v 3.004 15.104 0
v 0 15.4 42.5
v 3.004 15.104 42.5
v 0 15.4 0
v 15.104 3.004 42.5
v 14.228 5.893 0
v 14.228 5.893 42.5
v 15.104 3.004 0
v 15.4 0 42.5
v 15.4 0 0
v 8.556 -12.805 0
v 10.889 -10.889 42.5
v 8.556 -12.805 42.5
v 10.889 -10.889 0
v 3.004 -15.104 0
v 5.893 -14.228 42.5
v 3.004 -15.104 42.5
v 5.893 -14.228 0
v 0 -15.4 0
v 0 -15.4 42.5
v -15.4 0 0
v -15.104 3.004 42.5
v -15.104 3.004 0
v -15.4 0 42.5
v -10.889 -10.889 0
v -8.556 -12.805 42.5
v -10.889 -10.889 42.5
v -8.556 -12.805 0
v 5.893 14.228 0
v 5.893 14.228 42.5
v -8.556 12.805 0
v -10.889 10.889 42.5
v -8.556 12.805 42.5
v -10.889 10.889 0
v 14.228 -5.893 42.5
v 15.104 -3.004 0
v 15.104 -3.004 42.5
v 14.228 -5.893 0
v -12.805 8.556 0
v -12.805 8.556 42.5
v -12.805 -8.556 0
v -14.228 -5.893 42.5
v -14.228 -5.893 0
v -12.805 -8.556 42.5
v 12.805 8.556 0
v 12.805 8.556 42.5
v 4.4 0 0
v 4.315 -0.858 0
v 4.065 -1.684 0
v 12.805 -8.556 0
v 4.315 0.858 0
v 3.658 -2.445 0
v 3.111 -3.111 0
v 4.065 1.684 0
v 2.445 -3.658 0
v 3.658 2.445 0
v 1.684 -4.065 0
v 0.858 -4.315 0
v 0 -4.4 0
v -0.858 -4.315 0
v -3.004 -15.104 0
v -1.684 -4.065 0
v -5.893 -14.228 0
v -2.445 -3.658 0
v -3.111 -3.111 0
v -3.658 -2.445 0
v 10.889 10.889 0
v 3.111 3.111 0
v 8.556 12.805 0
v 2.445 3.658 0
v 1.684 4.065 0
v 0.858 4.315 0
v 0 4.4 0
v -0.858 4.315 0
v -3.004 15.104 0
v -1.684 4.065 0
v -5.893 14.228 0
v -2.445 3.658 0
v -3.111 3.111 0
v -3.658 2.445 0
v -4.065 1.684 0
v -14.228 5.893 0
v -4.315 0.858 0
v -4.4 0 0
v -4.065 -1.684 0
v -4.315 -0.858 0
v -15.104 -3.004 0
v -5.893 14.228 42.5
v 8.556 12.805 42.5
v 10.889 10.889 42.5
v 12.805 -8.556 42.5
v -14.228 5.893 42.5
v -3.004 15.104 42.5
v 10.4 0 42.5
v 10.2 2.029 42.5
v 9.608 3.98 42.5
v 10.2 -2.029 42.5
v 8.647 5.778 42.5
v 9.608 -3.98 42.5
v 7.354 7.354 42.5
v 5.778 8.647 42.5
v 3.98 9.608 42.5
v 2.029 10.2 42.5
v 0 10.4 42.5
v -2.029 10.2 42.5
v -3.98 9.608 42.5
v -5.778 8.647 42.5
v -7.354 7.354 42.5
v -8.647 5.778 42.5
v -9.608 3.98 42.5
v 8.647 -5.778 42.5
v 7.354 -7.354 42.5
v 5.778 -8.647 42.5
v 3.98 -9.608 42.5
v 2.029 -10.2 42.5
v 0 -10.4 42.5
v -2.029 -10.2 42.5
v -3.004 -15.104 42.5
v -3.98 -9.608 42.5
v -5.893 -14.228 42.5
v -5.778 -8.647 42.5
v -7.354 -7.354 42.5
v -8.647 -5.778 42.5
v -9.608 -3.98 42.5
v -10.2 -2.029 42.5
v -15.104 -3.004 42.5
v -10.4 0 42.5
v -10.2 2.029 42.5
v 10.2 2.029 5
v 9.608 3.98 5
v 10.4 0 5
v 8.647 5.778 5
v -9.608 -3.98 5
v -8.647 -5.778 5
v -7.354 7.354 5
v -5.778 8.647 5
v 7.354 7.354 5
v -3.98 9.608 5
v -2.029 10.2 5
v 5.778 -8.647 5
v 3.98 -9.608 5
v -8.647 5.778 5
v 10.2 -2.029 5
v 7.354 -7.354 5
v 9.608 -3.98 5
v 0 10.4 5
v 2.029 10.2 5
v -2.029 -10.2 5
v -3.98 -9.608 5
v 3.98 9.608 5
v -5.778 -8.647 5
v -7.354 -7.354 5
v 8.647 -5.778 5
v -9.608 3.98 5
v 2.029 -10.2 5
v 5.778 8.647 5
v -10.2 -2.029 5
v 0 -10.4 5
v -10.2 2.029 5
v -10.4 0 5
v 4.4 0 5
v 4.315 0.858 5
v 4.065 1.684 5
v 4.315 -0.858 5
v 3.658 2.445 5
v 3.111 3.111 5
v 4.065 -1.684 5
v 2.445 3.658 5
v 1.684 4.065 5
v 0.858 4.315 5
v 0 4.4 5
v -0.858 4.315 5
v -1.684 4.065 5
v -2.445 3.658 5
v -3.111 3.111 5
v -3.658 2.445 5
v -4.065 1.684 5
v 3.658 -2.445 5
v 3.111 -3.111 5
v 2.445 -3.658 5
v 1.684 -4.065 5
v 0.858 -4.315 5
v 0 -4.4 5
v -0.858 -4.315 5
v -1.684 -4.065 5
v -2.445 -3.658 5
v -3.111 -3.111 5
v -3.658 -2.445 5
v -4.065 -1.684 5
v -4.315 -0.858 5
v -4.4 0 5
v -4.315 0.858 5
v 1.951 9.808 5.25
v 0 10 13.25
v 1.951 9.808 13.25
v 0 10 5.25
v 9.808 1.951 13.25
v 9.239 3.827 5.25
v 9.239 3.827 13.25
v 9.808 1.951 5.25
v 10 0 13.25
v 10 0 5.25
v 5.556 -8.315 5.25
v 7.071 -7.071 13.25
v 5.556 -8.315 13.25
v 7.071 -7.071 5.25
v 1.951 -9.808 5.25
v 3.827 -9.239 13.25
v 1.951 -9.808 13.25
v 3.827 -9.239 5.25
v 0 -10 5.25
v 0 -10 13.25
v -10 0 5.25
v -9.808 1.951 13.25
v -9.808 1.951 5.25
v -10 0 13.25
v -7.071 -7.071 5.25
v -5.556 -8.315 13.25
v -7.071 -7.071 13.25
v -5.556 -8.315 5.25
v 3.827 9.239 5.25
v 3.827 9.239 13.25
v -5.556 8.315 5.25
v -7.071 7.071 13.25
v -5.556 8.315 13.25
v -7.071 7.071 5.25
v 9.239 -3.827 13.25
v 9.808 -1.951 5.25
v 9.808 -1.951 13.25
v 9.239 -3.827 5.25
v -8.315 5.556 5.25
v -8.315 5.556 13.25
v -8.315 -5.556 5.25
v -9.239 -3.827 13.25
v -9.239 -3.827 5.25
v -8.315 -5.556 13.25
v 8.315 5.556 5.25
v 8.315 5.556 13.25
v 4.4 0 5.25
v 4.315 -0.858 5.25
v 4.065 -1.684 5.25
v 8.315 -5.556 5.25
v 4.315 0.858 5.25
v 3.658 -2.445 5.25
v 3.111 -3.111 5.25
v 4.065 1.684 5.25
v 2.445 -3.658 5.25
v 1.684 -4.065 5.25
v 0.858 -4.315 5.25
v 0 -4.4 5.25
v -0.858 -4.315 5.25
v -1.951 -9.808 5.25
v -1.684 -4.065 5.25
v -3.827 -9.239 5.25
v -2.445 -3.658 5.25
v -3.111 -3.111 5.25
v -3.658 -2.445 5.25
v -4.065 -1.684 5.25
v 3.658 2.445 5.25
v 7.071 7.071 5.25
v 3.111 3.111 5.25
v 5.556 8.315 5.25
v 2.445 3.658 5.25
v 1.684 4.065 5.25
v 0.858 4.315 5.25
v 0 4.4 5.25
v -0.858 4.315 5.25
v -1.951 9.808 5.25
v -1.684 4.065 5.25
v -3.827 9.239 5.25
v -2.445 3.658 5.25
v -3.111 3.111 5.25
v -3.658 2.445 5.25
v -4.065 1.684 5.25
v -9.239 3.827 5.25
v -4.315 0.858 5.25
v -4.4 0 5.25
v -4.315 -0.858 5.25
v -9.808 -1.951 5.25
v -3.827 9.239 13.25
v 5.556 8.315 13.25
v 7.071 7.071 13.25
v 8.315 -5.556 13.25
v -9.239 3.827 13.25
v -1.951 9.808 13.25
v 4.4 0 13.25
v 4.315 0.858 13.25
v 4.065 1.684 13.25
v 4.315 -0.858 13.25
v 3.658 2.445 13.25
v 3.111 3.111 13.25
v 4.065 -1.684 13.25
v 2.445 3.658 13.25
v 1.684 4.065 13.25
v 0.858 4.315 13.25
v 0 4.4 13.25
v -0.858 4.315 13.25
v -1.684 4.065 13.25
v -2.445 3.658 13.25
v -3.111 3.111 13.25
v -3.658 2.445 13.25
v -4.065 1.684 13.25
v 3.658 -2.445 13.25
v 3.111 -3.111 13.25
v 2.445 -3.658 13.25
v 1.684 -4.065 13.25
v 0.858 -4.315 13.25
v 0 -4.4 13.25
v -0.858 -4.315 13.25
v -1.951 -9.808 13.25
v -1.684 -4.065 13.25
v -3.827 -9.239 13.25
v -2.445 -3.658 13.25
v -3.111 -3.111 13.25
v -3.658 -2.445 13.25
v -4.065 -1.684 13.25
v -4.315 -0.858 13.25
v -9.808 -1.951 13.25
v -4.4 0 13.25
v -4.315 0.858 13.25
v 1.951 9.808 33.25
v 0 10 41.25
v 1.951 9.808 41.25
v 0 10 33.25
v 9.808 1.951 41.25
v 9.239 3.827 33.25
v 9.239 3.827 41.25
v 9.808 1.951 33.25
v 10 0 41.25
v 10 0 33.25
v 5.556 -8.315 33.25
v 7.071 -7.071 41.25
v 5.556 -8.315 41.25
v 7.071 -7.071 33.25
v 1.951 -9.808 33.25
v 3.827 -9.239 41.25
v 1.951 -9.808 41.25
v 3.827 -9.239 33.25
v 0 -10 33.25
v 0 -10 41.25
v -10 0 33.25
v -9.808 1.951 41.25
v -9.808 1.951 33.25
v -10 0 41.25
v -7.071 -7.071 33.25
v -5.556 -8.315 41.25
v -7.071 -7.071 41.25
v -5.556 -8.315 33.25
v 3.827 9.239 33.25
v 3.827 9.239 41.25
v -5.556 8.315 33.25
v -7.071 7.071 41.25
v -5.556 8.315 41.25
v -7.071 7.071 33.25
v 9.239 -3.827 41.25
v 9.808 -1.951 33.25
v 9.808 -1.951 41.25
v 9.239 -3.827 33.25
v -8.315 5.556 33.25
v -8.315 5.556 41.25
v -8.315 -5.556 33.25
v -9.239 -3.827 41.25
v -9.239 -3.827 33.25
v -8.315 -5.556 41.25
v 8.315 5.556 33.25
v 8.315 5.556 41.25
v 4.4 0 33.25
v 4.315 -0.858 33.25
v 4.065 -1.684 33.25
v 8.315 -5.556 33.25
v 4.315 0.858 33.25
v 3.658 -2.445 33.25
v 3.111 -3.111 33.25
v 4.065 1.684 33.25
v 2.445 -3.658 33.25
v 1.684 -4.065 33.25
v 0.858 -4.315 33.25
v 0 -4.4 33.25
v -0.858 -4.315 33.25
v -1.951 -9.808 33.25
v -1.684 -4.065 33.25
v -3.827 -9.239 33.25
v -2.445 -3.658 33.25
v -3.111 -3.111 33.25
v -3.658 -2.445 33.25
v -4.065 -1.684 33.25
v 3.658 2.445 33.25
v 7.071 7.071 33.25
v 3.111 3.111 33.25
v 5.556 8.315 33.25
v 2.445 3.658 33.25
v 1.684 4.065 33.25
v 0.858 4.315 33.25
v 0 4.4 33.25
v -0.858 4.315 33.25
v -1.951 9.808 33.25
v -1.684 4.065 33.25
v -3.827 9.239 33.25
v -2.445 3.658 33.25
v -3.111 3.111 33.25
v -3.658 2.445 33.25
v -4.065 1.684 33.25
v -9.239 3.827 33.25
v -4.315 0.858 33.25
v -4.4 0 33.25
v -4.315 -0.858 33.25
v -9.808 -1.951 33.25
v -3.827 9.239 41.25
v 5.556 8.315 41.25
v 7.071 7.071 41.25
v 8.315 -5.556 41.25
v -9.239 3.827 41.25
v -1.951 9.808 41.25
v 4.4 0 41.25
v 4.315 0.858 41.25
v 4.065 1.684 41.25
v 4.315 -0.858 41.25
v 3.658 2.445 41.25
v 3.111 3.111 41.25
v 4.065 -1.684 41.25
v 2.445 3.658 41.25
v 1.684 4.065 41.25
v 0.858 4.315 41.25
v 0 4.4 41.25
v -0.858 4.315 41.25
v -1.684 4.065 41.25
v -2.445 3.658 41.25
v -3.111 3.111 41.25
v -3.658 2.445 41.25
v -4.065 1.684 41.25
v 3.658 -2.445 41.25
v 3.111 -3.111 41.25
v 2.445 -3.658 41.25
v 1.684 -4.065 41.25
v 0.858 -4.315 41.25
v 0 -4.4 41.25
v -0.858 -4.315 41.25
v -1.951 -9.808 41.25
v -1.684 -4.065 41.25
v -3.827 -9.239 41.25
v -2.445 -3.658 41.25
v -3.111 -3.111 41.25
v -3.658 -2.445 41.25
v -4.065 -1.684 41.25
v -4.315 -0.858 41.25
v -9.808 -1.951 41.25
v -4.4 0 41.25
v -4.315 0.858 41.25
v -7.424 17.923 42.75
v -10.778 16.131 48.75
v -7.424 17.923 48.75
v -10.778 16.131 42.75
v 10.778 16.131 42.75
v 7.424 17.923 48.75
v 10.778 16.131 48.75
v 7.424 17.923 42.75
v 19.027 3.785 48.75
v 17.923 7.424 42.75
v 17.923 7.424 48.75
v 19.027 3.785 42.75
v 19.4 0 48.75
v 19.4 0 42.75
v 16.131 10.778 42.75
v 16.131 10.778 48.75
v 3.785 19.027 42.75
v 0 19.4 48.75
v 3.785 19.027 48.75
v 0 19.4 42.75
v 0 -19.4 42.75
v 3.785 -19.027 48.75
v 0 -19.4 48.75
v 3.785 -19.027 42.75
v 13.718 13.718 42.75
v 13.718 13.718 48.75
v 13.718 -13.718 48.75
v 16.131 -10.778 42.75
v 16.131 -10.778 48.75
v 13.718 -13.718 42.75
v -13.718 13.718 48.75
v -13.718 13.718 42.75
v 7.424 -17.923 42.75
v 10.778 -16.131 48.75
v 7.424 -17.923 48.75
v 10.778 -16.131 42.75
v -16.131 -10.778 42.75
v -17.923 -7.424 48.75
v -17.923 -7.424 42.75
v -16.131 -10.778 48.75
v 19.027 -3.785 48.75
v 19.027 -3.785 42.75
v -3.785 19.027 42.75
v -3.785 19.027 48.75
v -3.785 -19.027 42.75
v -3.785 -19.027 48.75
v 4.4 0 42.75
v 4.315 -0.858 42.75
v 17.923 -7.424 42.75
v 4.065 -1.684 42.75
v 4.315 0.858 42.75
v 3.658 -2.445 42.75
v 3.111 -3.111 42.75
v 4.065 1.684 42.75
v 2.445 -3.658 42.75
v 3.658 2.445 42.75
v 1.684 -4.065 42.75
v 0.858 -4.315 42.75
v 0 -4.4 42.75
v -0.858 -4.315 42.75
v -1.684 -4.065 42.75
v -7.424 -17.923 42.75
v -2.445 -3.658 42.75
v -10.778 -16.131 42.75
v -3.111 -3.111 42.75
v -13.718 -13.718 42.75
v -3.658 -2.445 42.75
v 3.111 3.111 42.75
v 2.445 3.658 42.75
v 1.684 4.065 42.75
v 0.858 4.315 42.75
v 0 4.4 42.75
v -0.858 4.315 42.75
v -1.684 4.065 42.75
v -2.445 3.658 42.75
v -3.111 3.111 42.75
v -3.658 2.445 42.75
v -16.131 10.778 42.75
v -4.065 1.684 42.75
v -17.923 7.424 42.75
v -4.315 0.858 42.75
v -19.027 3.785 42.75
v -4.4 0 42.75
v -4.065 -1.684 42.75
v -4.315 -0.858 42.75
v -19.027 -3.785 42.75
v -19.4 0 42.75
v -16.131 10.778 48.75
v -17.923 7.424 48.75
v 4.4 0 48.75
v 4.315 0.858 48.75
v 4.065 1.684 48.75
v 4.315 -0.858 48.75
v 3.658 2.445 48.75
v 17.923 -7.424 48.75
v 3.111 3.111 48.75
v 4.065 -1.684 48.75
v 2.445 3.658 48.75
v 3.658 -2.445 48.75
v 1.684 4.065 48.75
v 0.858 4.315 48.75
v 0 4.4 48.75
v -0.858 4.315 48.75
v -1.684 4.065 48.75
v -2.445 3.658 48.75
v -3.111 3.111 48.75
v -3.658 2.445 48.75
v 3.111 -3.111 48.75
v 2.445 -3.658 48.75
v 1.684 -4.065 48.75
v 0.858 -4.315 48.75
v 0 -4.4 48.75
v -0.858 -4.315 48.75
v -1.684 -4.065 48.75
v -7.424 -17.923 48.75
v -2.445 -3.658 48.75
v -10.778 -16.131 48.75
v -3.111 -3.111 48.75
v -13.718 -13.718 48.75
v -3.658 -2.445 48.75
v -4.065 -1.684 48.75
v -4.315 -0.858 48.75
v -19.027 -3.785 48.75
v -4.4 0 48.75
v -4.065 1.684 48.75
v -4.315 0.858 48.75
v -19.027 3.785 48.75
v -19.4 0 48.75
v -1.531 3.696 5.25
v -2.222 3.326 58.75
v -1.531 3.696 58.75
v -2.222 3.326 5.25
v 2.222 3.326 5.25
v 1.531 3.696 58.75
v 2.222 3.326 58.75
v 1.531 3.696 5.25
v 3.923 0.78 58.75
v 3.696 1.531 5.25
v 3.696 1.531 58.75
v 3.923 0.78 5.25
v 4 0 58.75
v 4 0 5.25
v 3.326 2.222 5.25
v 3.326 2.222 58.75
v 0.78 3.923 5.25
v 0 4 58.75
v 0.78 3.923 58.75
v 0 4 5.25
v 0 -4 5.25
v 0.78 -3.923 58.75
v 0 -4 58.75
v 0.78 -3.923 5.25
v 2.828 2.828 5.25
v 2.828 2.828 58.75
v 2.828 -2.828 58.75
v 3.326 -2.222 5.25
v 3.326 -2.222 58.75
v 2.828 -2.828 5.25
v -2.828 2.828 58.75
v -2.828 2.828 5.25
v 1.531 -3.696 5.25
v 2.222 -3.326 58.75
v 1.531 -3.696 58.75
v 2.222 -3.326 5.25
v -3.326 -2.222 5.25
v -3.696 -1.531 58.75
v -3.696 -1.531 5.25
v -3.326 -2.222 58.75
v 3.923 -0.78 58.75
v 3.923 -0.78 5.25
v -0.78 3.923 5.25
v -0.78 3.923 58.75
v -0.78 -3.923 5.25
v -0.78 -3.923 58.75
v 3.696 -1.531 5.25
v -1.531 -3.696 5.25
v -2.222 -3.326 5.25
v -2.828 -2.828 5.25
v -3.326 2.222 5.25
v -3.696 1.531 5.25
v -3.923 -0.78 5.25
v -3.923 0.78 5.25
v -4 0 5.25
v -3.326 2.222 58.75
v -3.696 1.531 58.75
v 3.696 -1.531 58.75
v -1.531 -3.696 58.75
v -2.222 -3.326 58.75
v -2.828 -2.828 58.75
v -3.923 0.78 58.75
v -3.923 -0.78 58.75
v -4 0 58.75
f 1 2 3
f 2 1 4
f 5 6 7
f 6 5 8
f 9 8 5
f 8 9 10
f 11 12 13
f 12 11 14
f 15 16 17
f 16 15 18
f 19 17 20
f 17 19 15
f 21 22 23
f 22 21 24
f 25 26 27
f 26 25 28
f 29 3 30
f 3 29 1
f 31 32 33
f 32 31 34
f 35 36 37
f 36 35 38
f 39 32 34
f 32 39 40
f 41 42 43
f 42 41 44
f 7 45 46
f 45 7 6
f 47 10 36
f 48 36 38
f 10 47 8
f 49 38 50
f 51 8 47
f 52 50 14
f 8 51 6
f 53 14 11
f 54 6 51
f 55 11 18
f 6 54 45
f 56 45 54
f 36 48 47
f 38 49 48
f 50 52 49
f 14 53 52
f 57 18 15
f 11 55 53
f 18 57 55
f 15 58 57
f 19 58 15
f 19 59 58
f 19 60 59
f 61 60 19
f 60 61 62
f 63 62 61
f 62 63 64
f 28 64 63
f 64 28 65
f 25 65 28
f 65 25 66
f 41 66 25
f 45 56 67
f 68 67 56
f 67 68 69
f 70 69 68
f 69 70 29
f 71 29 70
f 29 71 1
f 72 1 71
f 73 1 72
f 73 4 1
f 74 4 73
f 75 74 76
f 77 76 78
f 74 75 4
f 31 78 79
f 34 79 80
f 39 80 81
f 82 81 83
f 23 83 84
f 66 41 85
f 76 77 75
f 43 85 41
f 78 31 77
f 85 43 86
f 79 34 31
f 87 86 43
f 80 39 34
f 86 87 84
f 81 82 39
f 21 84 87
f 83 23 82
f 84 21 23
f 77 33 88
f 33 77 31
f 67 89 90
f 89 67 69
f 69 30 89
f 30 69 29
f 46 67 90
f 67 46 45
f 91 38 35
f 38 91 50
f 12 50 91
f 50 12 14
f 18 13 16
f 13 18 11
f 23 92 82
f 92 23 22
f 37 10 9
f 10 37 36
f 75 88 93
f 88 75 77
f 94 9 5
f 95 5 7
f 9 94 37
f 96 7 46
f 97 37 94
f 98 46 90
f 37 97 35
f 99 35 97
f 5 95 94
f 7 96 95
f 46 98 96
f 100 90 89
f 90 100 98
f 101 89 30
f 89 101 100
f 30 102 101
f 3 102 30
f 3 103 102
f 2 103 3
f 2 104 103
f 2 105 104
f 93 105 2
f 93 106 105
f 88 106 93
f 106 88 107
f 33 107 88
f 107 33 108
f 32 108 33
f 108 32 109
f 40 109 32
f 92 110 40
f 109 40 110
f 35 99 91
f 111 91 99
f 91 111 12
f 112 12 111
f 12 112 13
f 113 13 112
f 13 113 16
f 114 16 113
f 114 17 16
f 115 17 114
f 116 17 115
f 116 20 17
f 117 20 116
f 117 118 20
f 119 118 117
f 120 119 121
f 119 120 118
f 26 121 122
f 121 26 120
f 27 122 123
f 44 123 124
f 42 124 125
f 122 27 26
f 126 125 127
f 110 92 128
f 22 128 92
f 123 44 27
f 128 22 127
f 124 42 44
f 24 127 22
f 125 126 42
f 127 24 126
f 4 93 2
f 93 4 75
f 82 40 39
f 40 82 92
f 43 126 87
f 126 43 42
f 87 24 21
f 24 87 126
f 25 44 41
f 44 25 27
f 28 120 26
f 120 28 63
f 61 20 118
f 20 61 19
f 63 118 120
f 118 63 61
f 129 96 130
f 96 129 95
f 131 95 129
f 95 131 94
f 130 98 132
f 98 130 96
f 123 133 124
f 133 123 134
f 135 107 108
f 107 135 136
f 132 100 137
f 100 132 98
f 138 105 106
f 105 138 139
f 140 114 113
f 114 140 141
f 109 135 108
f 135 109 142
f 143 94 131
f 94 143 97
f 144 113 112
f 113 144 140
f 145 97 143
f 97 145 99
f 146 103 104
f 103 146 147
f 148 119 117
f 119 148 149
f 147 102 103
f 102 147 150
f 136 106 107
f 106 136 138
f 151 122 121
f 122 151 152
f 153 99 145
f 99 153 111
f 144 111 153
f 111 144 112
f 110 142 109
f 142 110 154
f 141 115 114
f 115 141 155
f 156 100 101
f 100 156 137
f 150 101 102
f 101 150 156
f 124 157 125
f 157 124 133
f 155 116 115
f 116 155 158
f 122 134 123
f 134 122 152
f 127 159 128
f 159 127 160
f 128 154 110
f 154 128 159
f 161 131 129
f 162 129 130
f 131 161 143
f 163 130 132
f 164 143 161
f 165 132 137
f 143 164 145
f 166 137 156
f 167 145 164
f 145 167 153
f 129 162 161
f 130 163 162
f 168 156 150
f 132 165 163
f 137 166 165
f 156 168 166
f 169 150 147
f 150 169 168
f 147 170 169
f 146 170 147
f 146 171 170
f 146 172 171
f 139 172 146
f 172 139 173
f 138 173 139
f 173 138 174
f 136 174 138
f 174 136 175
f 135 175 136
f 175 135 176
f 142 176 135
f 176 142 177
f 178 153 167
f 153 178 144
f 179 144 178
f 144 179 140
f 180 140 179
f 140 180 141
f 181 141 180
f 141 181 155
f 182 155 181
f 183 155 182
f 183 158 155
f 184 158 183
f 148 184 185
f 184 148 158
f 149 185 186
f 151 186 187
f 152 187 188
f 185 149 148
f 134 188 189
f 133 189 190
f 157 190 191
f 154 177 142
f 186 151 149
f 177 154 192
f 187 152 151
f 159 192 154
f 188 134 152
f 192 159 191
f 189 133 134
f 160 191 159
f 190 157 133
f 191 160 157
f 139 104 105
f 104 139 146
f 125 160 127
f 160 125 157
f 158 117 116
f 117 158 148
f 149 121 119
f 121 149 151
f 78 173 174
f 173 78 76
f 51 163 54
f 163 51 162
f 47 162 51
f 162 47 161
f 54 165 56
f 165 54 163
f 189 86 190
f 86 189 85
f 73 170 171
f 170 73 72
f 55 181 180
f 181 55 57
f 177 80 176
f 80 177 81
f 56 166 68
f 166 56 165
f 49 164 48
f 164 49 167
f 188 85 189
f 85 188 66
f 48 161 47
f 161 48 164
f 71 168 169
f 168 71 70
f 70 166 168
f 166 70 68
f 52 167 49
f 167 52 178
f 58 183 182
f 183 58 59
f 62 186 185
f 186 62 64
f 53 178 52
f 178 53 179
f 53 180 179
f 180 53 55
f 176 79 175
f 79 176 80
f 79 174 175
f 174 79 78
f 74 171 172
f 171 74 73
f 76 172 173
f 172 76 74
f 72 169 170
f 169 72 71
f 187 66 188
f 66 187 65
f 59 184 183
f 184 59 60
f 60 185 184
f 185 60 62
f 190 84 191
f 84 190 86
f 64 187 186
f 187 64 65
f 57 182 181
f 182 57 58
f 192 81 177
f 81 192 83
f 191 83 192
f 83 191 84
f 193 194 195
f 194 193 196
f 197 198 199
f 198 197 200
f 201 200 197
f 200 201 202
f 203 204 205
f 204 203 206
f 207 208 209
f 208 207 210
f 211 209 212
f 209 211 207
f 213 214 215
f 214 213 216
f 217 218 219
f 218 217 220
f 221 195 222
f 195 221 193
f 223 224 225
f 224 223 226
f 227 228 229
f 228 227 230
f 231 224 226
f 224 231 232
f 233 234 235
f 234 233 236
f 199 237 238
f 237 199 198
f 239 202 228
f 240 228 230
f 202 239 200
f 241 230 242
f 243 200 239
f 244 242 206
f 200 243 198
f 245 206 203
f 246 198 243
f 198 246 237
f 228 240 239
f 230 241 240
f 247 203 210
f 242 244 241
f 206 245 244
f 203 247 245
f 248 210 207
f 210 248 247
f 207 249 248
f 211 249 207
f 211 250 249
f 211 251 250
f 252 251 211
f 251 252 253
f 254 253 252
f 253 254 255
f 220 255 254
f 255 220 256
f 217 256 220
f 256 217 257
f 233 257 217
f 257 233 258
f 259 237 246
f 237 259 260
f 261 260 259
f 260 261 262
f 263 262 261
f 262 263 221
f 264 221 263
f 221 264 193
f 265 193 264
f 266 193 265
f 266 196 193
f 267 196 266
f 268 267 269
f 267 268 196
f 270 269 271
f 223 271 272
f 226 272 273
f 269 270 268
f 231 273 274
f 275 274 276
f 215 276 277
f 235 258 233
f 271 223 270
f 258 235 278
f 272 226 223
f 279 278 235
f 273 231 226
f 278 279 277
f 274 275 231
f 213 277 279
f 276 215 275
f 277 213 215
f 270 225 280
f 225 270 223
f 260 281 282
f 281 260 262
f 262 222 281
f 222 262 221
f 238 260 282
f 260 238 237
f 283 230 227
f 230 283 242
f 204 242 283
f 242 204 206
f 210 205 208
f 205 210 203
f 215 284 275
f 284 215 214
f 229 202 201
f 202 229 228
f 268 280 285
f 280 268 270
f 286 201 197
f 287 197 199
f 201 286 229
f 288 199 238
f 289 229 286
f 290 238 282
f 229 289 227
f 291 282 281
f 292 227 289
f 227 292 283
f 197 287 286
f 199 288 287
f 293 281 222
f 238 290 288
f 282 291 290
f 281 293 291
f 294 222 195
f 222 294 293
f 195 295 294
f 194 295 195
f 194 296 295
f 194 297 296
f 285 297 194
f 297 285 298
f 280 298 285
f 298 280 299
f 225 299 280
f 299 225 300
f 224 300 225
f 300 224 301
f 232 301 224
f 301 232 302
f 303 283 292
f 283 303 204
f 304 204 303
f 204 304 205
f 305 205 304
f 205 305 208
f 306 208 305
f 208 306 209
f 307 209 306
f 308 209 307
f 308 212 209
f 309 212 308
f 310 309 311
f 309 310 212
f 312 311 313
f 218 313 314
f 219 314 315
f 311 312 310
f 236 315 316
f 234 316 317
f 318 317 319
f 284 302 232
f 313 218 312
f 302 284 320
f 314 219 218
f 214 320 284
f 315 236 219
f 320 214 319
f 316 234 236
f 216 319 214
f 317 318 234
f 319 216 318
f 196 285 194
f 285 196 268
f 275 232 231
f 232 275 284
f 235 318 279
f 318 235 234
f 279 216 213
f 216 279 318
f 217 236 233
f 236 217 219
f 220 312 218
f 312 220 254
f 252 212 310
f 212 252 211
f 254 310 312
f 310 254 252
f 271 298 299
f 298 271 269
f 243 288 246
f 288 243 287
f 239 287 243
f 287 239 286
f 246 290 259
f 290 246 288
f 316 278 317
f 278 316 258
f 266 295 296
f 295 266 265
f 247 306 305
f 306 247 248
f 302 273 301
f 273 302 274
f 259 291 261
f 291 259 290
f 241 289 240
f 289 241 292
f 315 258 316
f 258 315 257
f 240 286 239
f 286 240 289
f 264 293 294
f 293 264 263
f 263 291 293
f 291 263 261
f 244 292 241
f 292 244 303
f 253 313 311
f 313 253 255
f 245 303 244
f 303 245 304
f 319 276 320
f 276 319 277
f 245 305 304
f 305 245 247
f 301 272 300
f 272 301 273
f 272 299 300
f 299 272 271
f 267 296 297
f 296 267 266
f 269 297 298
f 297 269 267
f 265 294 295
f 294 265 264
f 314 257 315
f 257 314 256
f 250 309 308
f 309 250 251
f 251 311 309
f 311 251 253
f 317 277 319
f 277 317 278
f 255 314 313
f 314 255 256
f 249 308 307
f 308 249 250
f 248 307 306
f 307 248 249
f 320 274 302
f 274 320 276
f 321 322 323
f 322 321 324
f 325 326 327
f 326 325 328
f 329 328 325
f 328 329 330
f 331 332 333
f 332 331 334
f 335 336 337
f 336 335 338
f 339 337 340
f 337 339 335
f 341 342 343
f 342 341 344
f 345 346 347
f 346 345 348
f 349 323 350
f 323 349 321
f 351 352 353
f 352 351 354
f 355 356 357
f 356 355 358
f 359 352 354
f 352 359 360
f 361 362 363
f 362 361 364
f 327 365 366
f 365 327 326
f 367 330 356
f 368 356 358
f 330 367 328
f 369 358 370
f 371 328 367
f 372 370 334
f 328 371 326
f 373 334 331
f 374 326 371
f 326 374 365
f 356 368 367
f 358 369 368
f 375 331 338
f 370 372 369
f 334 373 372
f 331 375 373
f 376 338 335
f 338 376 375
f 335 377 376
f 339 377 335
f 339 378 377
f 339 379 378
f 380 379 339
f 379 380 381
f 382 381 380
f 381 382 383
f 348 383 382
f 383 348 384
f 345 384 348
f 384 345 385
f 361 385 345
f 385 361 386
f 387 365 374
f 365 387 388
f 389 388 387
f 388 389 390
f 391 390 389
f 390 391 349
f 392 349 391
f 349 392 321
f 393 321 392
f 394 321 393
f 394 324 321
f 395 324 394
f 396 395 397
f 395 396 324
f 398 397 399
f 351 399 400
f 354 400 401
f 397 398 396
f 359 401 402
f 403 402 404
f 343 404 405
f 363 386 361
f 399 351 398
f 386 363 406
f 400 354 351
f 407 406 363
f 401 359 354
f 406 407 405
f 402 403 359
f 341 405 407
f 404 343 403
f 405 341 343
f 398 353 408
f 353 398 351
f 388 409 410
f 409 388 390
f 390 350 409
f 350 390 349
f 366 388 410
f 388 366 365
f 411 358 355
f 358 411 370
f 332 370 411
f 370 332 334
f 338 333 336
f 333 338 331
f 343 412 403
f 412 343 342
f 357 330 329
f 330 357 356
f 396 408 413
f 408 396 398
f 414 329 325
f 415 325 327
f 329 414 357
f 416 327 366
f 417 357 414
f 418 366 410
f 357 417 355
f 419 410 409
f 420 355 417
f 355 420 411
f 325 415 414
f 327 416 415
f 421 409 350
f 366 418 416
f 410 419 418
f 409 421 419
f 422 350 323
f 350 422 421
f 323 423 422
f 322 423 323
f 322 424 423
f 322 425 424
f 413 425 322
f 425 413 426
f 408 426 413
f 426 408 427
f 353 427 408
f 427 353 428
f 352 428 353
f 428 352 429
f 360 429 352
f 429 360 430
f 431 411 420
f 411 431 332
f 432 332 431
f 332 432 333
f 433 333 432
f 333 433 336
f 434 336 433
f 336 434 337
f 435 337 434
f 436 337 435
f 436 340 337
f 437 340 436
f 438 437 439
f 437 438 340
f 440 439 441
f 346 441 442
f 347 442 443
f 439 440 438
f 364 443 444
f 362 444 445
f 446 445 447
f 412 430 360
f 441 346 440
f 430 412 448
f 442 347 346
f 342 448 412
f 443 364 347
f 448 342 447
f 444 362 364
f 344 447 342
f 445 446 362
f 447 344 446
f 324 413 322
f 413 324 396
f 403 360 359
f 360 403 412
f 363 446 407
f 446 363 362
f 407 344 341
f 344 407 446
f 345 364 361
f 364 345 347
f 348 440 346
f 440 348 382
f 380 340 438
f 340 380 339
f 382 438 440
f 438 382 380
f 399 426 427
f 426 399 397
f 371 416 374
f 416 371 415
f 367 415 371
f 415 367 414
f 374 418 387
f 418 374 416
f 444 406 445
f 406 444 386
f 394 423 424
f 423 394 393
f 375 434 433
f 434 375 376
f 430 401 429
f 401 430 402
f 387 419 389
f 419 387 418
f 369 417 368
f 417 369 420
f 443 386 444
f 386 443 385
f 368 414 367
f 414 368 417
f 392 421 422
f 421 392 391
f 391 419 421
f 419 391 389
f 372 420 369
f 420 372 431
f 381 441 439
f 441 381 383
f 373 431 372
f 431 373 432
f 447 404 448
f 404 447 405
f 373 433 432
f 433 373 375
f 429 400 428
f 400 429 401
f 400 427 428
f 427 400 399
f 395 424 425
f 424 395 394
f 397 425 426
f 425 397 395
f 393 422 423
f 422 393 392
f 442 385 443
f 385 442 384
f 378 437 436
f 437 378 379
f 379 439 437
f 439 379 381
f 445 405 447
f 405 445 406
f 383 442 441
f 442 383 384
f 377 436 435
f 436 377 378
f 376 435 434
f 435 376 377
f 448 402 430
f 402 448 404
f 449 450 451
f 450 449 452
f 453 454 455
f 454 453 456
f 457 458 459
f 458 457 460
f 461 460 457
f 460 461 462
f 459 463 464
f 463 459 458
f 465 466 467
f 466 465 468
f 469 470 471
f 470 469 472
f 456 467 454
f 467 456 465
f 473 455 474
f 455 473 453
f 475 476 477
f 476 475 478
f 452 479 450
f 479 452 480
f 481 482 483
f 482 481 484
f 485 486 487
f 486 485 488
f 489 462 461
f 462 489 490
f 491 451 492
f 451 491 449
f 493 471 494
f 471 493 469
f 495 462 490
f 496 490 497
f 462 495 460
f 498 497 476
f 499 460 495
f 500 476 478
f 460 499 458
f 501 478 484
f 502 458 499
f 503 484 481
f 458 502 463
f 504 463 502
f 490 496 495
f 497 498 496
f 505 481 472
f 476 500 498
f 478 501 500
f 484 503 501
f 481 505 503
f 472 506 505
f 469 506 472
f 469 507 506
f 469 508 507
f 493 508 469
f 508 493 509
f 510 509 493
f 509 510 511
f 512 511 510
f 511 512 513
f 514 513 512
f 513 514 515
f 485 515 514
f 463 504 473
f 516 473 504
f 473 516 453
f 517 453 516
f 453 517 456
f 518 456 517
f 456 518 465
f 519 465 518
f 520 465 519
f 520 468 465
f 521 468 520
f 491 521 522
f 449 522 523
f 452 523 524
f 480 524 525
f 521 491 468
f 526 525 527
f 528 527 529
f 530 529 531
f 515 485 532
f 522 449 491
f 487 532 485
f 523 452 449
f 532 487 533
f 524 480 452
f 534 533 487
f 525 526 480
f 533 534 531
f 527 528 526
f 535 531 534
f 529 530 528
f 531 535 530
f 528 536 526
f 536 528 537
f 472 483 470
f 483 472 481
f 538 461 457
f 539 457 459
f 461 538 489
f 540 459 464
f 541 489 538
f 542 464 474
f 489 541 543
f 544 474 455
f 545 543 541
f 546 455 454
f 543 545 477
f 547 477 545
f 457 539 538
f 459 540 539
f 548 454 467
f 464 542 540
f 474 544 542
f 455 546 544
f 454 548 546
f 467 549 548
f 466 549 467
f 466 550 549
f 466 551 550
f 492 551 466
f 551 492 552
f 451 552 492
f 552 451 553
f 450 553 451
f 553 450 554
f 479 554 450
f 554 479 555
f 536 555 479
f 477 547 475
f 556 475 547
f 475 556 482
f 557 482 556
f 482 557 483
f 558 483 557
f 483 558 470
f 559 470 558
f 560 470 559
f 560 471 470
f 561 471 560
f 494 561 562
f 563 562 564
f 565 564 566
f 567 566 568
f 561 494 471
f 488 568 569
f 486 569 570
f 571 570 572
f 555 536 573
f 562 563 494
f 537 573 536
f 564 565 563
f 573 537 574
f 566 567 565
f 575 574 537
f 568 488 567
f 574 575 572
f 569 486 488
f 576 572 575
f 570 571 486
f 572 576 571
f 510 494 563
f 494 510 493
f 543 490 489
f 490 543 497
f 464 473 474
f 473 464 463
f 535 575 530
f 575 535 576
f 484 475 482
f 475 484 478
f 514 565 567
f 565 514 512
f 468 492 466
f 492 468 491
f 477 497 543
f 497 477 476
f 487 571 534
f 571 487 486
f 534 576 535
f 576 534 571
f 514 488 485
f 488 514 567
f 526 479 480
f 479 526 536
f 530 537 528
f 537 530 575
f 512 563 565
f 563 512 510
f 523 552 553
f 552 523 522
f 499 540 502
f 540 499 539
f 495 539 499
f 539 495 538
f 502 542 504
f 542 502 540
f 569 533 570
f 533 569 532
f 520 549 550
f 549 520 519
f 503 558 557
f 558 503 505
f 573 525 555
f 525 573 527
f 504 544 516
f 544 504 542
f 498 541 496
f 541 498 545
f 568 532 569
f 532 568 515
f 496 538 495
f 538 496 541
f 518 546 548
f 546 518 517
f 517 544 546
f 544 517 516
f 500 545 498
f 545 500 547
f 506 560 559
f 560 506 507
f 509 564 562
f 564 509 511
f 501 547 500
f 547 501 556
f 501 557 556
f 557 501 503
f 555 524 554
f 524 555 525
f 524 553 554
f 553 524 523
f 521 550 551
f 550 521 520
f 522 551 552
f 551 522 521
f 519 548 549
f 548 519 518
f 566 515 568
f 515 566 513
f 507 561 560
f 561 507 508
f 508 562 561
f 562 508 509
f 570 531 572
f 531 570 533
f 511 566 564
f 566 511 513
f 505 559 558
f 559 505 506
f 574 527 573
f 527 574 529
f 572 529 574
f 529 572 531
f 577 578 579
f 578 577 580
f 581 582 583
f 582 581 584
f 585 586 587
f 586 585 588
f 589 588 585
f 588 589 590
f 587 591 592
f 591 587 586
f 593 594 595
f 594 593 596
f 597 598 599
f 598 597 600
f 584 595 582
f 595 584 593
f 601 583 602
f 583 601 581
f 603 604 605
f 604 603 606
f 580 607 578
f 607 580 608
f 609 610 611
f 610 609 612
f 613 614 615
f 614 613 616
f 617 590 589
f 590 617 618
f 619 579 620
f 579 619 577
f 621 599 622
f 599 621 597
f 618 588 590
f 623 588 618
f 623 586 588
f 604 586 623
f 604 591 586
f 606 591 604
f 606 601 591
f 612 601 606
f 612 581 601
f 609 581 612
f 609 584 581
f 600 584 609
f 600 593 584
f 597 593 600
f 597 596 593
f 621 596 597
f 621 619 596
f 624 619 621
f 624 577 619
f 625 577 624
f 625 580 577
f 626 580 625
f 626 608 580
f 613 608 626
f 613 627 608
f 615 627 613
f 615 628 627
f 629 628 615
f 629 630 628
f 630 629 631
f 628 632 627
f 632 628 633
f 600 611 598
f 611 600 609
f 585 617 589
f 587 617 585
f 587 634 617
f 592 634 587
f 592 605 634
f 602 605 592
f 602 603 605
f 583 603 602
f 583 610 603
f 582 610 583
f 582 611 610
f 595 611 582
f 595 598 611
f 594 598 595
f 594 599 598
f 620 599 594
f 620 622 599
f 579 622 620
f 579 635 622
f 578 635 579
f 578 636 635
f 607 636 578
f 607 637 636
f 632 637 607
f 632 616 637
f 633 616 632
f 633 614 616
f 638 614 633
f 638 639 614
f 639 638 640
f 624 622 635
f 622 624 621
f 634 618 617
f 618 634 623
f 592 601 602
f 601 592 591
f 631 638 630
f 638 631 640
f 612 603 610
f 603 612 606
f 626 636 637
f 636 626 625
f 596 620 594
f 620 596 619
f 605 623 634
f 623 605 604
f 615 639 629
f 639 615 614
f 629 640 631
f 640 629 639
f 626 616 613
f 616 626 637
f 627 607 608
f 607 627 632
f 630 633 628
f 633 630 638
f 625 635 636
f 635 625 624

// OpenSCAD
$fn = 32;

// ------------------------------------------------------------------------
// Shaft station: cup d30.8 x 42.5 mm, shaft d8
// Every part is its own module, assembly() places every instance.
// ------------------------------------------------------------------------

// --- part 1 ---
module housing_cup() {
  difference() {
    cylinder(h = 42.5, d = 30.8);
    translate([0, 0, 5]) cylinder(h = 38.5, d = 20.8);
    translate([0, 0, -1]) cylinder(h = 7, d = 8.8);
  }
}

// --- part 2 ---
module bearing_lower() {
  difference() {
      translate([0, 0, 0]) cylinder(h = 8, d = 20);
      translate([0, 0, -1]) cylinder(h = 10, d = 8.8);
    }
}

// --- part 3 ---
module bearing_upper() {
  difference() {
      translate([0, 0, 0]) cylinder(h = 8, d = 20);
      translate([0, 0, -1]) cylinder(h = 10, d = 8.8);
    }
}

// --- part 4 ---
module station_shaft() {
  translate([0, 0, -26.75]) cylinder(h = 53.5, d = 8);
}

// --- part 5 ---
module station_cover() {
  difference() {
    cylinder(h = 6, d = 38.8);
    translate([0, 0, -1]) cylinder(h = 8, d = 8.8);
  }
}

// --- assembly ---
module assembly() {
  color([0.80, 0.24, 0.20]) translate([0, 0, 0]) rotate([0, 0, 0]) housing_cup();
  color([0.20, 0.45, 0.75]) translate([0, 0, 5.25]) rotate([0, 0, 0]) bearing_lower();
  color([0.25, 0.62, 0.32]) translate([0, 0, 33.25]) rotate([0, 0, 0]) bearing_upper();
  color([0.92, 0.70, 0.18]) translate([0, 0, 32]) rotate([0, 0, 0]) station_shaft();
  color([0.58, 0.35, 0.70]) translate([0, 0, 42.75]) rotate([0, 0, 0]) station_cover();
}

assembly();
